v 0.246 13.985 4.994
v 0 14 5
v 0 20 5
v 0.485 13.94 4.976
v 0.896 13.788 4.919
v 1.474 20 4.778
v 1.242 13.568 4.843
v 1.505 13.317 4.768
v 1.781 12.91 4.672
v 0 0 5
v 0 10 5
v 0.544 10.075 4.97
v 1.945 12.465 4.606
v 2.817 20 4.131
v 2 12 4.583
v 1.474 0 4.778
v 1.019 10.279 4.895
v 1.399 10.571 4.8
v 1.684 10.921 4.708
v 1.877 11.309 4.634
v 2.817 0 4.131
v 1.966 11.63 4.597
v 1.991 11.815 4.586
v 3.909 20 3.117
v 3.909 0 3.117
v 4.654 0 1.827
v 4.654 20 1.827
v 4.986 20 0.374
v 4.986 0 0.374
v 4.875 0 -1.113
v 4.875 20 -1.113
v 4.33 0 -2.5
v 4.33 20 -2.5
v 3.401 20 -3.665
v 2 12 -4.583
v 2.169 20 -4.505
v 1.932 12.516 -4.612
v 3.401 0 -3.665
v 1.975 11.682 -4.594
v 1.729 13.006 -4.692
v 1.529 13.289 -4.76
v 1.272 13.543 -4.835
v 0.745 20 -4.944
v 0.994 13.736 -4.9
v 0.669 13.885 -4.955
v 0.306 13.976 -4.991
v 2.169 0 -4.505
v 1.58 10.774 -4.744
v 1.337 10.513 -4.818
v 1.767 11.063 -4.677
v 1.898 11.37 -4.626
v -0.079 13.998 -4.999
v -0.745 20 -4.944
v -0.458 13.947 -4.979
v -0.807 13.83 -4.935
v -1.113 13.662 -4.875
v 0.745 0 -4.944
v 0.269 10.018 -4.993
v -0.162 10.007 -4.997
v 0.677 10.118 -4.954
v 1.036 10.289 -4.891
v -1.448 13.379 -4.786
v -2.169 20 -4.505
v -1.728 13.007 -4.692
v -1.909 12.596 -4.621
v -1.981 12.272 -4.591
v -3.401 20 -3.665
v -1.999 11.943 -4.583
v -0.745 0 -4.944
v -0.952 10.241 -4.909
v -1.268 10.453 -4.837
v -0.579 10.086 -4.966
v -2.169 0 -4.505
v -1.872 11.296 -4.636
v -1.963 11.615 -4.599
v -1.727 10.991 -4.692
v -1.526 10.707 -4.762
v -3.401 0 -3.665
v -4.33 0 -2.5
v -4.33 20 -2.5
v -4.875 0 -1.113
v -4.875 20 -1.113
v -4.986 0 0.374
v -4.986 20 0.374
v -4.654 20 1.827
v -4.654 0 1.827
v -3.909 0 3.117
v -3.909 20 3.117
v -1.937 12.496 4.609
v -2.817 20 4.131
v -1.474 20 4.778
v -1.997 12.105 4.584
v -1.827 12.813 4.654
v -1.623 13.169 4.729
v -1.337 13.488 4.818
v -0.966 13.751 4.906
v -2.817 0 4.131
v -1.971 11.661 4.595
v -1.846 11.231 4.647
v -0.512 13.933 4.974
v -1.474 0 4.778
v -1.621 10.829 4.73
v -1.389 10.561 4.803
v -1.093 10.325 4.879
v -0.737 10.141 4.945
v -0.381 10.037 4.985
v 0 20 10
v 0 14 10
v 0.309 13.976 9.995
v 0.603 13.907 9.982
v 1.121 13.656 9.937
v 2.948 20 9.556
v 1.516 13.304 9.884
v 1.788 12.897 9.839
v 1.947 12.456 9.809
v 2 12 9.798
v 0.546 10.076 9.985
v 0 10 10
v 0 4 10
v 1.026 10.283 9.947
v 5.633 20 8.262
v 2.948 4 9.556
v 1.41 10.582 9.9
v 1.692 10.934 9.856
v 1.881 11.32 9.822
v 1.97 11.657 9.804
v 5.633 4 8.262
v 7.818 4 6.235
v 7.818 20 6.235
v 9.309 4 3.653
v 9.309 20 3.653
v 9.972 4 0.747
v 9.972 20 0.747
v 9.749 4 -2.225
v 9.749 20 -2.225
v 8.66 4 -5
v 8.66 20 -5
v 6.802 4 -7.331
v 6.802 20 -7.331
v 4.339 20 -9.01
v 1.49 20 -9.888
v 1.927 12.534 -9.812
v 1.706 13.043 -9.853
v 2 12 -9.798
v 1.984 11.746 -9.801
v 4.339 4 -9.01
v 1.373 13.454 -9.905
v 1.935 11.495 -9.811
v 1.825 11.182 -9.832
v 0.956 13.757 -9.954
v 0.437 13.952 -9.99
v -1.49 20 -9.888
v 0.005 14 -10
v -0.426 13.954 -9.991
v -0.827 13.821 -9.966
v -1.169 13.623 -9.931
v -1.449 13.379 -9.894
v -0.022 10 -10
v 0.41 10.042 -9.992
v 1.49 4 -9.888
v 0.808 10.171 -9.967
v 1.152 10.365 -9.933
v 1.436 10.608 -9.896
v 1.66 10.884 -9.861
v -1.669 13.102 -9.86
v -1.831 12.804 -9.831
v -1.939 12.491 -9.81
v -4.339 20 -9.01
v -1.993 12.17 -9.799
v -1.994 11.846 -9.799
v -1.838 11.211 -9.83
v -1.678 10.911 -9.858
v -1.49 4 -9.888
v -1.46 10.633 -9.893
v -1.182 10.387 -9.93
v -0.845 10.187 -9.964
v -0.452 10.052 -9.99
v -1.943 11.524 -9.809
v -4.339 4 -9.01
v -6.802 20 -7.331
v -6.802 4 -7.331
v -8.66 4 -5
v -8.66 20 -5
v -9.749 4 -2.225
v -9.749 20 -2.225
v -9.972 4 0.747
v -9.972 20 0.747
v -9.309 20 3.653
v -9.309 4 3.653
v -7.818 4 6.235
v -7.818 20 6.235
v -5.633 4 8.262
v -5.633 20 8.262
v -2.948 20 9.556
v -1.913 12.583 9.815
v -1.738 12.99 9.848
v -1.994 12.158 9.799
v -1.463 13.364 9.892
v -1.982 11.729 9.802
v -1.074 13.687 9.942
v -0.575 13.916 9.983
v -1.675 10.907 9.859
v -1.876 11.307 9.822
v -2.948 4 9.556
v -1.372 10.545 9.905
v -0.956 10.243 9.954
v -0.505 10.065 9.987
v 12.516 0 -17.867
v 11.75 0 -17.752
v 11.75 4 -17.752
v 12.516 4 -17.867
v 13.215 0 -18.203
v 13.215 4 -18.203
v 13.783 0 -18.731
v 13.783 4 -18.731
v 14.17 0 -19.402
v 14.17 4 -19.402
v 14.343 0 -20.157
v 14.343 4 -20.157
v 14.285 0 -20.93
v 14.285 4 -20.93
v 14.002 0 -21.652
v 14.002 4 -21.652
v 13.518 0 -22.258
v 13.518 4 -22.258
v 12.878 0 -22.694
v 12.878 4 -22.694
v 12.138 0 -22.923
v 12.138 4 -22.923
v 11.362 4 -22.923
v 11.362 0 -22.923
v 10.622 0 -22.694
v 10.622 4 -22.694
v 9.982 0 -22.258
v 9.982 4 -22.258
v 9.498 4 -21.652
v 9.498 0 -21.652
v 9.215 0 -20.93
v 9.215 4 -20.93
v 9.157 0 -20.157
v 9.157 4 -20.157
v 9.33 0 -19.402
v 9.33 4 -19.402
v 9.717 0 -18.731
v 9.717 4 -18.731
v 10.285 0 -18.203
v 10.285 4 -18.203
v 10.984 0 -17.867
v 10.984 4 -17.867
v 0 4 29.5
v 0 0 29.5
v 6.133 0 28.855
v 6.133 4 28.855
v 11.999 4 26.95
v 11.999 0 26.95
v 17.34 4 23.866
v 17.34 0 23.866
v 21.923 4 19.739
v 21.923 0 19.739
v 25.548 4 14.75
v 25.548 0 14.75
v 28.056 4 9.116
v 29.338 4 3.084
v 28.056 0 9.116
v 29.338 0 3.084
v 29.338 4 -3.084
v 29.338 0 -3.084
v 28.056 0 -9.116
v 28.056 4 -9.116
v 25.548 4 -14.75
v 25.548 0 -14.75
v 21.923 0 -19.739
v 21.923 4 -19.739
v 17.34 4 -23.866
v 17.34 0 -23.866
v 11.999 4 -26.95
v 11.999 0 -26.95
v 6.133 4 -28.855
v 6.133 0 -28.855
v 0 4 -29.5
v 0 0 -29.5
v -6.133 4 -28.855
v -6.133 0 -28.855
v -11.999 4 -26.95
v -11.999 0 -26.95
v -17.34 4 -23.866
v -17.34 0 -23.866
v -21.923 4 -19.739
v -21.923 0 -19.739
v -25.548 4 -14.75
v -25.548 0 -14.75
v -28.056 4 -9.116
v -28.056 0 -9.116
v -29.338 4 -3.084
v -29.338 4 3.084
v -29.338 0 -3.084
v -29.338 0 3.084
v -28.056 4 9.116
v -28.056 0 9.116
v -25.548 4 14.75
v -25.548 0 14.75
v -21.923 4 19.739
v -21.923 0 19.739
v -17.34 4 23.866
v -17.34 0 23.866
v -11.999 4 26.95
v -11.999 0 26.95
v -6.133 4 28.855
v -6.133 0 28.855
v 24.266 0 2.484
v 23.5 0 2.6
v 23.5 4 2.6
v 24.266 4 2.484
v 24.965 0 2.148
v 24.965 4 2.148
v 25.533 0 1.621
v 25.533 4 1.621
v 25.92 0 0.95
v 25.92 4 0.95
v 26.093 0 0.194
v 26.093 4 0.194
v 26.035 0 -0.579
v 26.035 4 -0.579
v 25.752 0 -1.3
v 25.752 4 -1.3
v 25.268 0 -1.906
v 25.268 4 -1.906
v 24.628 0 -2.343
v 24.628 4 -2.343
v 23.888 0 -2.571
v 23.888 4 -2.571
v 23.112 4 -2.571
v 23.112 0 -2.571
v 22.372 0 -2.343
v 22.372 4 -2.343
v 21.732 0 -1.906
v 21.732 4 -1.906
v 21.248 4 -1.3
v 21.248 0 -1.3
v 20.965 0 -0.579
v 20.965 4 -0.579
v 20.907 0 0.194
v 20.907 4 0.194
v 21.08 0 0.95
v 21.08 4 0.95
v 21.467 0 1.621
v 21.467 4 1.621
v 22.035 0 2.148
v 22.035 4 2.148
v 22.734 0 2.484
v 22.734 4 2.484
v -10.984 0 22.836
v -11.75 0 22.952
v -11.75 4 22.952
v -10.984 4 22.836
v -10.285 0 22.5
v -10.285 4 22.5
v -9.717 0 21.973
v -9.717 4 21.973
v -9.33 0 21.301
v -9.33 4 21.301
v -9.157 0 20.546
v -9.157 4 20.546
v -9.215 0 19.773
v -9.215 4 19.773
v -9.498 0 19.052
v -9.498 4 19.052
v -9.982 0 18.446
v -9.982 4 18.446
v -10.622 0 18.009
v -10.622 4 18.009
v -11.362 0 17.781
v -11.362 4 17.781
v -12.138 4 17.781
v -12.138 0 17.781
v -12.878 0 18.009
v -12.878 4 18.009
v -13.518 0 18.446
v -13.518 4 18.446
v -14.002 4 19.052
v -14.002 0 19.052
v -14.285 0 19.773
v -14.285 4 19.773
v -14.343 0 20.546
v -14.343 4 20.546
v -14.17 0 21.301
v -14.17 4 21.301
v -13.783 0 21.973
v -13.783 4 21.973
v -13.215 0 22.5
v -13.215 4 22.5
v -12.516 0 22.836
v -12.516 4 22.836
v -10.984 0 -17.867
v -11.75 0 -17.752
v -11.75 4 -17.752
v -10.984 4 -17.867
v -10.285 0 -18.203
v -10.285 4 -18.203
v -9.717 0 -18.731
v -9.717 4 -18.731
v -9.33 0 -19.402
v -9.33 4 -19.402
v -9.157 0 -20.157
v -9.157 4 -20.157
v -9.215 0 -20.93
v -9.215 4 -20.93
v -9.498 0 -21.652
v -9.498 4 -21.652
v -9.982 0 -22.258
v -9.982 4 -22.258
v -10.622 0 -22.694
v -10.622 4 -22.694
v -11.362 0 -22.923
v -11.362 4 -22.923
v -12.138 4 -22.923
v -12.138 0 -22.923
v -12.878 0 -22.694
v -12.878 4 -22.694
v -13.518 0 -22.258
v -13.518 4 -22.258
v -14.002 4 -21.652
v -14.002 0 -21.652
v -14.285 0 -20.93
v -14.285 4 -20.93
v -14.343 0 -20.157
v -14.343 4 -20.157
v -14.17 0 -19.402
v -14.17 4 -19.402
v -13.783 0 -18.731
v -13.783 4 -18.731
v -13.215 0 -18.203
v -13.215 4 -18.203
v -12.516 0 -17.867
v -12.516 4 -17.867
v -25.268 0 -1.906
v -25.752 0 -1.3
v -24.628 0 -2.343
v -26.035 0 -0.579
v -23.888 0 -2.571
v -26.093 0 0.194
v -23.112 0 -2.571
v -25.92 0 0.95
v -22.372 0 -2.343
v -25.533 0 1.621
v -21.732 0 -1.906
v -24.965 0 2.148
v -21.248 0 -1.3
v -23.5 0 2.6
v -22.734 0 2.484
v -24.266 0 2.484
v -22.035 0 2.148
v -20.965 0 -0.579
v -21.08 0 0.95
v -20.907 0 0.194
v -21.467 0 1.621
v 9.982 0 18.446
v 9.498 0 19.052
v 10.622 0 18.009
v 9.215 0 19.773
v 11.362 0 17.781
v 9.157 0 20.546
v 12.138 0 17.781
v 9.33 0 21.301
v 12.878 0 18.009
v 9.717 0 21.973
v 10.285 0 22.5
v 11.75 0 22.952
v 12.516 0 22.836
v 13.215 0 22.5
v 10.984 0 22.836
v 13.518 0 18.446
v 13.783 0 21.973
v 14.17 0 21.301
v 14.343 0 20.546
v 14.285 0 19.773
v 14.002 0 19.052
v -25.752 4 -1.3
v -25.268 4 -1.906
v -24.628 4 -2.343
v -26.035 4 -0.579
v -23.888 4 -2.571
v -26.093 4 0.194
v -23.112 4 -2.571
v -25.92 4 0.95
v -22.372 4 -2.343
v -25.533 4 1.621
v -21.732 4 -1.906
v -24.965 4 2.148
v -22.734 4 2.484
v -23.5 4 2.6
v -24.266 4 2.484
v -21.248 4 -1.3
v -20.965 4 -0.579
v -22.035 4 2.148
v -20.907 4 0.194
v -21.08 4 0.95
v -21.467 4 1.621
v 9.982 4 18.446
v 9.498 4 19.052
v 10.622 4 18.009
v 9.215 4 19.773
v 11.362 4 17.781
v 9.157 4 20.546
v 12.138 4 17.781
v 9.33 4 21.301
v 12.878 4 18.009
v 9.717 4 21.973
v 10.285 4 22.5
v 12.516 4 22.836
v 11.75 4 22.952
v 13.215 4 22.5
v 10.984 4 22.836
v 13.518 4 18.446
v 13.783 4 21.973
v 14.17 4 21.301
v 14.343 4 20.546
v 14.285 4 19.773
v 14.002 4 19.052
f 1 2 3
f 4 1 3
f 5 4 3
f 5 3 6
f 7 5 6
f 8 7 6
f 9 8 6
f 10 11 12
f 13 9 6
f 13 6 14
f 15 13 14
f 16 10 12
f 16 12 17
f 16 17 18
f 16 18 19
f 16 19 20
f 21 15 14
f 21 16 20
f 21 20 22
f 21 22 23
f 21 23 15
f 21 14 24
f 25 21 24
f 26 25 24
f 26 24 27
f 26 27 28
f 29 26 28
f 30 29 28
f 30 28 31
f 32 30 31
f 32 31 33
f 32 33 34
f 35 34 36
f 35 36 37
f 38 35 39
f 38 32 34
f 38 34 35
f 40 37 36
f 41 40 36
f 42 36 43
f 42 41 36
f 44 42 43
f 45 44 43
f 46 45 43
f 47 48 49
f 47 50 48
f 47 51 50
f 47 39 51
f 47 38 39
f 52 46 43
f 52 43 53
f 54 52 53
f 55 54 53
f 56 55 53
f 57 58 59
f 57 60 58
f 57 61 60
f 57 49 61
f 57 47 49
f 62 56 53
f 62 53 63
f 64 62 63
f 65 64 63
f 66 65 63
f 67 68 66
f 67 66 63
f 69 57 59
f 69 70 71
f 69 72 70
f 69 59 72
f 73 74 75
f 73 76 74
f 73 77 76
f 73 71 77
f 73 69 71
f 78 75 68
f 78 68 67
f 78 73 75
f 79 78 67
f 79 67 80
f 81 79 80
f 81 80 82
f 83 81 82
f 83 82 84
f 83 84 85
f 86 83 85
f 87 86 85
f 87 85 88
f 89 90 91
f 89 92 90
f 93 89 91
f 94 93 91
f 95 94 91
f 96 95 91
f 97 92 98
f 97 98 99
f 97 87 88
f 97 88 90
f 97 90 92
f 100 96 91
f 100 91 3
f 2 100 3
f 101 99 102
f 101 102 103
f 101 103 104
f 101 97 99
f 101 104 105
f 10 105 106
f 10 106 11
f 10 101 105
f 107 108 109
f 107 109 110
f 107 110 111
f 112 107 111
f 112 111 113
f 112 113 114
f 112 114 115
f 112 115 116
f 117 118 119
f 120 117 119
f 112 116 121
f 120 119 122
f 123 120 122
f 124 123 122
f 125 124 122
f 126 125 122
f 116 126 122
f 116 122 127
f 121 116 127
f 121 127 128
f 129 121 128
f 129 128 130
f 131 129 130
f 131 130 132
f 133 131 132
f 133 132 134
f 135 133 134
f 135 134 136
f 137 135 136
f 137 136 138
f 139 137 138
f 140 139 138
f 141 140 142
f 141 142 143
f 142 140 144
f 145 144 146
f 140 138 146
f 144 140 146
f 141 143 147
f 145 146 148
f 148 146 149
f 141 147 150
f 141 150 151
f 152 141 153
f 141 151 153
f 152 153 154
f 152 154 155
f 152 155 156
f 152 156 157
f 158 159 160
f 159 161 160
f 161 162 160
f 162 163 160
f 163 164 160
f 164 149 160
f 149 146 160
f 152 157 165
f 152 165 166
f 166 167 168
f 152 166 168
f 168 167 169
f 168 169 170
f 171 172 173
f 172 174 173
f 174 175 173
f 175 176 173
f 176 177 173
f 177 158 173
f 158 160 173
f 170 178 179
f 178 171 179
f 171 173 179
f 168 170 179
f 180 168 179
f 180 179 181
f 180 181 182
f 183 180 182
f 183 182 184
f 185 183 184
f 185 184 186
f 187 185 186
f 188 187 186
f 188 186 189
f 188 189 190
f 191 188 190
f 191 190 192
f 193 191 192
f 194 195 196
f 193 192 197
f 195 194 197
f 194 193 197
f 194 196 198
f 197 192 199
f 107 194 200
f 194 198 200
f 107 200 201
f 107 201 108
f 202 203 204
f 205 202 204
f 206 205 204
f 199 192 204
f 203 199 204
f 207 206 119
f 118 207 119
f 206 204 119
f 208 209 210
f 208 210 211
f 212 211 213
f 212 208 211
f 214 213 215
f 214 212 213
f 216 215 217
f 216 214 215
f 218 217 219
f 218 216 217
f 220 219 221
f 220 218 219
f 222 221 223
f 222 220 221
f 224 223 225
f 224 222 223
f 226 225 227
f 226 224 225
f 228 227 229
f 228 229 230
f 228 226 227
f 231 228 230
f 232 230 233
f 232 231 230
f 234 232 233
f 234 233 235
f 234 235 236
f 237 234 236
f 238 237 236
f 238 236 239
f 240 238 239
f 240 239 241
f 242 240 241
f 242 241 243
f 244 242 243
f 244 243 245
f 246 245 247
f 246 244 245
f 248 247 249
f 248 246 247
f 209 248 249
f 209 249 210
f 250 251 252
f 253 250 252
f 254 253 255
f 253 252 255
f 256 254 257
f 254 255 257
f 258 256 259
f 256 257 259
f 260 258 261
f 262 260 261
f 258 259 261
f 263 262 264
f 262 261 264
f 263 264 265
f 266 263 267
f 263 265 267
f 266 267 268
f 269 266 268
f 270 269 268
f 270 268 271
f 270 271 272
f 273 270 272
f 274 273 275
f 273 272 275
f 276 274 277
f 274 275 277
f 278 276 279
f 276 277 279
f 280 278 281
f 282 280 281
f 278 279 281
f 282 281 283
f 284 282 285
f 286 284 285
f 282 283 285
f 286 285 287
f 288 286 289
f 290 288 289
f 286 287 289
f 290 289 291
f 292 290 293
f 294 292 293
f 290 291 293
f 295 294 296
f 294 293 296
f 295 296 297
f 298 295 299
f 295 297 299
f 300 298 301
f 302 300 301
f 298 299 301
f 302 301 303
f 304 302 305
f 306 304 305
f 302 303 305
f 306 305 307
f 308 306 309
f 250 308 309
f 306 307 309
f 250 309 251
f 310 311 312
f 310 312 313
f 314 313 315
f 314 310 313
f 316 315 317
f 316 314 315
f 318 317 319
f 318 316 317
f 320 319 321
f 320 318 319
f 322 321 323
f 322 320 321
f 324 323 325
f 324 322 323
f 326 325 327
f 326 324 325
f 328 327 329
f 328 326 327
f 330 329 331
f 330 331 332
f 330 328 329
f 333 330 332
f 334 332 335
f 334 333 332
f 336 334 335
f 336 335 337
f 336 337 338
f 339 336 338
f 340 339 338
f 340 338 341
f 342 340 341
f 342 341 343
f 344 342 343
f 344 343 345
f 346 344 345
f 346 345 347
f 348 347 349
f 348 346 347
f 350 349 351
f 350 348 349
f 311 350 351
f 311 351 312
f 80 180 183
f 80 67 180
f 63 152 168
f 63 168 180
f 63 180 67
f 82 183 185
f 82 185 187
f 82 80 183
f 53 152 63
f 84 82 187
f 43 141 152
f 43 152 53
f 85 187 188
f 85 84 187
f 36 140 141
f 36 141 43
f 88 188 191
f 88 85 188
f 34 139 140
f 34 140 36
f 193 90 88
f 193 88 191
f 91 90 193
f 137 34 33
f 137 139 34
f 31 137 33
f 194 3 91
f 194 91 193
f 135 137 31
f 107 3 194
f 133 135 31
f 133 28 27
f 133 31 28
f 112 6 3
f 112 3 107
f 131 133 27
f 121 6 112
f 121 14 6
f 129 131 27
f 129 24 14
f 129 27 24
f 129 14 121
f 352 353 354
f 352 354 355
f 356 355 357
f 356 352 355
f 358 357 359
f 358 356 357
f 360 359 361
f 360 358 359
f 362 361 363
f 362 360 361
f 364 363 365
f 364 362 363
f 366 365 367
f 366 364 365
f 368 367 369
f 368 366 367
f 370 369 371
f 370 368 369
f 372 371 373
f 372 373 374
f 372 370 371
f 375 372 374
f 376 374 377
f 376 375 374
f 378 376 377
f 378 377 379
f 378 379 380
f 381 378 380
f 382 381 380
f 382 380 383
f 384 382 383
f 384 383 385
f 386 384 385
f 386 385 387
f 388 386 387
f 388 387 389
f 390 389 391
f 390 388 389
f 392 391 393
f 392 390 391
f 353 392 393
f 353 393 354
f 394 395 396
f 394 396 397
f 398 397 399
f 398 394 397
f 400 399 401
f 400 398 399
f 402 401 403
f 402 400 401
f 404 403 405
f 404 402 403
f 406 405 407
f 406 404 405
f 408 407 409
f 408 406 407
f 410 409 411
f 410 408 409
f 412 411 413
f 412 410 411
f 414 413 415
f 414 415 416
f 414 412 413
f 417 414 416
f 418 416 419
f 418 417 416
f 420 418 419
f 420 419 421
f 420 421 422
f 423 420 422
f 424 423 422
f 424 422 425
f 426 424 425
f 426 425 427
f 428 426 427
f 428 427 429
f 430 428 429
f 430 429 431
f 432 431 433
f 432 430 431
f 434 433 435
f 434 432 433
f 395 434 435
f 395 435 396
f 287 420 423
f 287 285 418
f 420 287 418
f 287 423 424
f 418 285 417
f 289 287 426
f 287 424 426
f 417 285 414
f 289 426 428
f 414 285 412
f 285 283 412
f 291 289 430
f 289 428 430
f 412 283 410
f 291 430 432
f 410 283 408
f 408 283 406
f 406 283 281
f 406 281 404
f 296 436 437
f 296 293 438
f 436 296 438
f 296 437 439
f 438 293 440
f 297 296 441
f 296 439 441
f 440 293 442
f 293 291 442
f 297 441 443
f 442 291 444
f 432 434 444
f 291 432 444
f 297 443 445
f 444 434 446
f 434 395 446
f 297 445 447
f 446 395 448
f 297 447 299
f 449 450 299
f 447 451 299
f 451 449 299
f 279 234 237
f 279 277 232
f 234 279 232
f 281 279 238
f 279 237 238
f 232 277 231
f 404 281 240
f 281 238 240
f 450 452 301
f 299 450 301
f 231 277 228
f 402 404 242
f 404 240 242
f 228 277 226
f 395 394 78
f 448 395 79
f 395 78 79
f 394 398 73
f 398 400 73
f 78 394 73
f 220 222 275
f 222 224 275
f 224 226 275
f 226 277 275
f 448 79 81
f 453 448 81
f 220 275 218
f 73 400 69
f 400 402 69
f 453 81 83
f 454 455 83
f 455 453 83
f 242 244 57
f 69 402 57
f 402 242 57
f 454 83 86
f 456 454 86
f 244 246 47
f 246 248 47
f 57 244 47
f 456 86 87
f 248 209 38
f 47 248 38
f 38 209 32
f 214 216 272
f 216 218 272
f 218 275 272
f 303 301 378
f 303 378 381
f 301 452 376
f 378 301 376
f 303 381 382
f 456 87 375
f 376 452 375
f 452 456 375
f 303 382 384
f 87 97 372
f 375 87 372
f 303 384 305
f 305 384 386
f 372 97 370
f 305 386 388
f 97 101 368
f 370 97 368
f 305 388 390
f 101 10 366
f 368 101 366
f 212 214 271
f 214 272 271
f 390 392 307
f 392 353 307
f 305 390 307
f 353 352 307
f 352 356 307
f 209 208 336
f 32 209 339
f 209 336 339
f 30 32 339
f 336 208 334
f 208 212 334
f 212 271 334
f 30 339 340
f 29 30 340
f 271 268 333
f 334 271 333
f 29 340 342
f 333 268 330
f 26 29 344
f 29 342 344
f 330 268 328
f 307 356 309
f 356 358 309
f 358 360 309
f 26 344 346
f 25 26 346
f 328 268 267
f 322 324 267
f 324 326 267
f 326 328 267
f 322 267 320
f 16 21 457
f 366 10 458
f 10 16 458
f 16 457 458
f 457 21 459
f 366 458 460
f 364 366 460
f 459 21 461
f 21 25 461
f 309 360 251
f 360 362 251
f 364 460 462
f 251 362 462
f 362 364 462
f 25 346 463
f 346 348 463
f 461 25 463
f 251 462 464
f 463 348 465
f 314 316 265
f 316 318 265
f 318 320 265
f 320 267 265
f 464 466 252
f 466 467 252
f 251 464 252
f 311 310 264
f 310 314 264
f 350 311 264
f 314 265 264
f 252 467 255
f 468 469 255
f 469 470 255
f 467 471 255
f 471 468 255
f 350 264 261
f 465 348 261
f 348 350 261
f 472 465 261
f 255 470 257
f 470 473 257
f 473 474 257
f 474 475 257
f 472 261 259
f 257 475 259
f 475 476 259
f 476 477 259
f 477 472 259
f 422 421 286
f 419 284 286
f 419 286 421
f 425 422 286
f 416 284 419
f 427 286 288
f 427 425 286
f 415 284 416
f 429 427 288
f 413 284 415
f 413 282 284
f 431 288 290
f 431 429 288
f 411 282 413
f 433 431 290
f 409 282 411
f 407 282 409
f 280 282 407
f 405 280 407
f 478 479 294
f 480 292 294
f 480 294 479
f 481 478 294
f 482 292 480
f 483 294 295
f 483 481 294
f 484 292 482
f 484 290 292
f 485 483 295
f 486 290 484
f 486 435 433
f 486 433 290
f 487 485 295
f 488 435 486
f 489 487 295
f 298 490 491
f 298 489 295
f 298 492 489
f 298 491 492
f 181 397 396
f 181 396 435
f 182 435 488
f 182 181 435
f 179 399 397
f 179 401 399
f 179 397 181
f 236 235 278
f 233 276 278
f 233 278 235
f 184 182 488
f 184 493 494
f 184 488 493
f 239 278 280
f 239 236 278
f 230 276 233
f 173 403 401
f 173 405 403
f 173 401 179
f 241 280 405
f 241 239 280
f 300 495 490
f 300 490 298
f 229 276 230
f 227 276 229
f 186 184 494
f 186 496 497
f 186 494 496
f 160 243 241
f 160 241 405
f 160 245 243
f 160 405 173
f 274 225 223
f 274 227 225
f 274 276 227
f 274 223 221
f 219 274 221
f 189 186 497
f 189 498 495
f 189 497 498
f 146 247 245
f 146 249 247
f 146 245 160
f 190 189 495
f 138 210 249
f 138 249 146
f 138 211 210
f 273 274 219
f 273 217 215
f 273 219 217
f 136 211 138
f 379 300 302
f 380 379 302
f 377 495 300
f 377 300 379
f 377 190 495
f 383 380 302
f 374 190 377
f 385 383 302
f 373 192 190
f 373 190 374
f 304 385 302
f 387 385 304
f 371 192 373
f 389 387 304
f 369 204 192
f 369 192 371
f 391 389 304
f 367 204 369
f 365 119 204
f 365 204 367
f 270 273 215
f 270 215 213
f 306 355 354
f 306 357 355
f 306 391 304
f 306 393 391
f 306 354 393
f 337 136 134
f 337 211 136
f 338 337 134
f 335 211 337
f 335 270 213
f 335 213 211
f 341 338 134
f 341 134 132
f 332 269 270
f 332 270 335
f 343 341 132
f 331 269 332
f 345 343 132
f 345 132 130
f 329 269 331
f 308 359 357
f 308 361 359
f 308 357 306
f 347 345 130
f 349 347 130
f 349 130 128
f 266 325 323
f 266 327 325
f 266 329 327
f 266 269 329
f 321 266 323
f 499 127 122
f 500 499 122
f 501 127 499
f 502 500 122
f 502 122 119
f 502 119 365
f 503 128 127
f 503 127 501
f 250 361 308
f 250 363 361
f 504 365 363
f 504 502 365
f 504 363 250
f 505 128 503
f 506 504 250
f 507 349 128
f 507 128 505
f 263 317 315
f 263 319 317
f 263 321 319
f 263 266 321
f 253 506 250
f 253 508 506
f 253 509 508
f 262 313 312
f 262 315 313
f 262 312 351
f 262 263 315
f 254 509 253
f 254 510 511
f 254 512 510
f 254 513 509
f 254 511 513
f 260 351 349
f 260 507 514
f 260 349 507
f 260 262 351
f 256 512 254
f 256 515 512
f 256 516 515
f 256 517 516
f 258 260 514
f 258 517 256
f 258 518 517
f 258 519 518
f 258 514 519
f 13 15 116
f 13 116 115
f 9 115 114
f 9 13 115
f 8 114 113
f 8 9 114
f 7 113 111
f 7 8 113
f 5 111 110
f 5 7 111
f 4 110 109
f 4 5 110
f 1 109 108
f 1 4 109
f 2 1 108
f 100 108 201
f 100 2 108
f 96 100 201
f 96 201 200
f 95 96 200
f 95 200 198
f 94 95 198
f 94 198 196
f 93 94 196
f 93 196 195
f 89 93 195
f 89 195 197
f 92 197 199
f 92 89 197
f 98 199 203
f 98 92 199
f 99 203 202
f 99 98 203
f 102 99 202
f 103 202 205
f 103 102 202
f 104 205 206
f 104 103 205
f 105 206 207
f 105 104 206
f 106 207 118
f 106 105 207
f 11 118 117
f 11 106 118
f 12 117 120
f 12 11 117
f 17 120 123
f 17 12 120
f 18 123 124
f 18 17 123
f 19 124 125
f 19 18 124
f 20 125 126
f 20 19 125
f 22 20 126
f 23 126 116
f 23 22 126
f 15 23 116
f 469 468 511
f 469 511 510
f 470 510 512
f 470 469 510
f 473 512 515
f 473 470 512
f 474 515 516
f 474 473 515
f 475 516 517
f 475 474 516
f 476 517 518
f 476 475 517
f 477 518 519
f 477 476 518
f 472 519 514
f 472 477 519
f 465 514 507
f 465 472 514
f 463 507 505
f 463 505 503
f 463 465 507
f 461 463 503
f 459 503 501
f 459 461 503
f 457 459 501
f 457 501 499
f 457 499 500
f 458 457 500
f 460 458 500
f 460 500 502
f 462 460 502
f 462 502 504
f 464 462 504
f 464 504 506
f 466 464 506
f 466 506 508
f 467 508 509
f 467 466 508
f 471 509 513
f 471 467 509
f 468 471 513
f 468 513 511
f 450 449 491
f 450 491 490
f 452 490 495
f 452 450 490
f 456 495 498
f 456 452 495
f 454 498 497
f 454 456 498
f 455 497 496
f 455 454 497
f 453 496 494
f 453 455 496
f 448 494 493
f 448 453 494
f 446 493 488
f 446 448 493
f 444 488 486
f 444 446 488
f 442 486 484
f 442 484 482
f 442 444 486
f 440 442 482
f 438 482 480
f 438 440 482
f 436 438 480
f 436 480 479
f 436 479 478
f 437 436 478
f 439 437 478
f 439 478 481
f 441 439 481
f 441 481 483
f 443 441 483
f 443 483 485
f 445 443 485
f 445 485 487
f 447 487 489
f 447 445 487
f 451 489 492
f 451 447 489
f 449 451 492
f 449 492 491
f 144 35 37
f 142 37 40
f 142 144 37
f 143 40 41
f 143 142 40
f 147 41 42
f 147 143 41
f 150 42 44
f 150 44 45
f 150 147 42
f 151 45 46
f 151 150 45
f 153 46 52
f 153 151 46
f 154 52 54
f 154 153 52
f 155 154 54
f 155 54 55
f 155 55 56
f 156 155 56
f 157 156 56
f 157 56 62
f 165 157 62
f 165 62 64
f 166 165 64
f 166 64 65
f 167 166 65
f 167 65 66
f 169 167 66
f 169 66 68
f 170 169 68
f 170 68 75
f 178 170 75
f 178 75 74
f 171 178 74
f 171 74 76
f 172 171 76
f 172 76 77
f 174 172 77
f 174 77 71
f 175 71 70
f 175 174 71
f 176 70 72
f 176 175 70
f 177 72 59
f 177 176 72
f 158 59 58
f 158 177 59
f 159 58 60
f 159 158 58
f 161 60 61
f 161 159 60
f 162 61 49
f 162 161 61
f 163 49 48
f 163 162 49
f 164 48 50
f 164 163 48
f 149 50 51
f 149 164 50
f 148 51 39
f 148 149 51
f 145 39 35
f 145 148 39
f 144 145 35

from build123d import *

# Parameters (mm, degrees)
SKETCH1_R               = 29.5
SKETCH1_R_2             = 2.6
SKETCH1_R_3             = 5
BOSS_EXTRUDE1_DEPTH     = 4
SKETCH1_3_R             = 10
SKETCH1_3_R_2           = 5
BOSS_EXTRUDE2_DEPTH     = 20
CUT_EXTRUDE1_DEPTH      = 47.265537931
CUT_EXTRUDE1_DEPTH_BACK = 47.265537931
SKETCH2_R               = 2


with BuildPart() as part:
    # Sketch1 → Boss-Extrude1 (new body)
    with BuildSketch(Plane(origin=(0, 0, 0), x_dir=(1, 0, 0), z_dir=(0, 1, 0))):
        Circle(SKETCH1_R)
        with Locations((-11.75, -20.351596989)):
            Circle(SKETCH1_R_2, mode=Mode.SUBTRACT)
        with Locations((11.75, -20.351596989)):
            Circle(SKETCH1_R_2, mode=Mode.SUBTRACT)
        with Locations((23.5, 0)):
            Circle(SKETCH1_R_2, mode=Mode.SUBTRACT)
        with Locations((-23.5, 0)):
            Circle(SKETCH1_R_2, mode=Mode.SUBTRACT)
        with Locations((-11.75, 20.351596989)):
            Circle(SKETCH1_R_2, mode=Mode.SUBTRACT)
        with Locations((11.75, 20.351596989)):
            Circle(SKETCH1_R_2, mode=Mode.SUBTRACT)
        Circle(SKETCH1_R_3, mode=Mode.SUBTRACT)
    extrude(amount=BOSS_EXTRUDE1_DEPTH)

    # Sketch1<3> → Boss-Extrude2 (add)
    with BuildSketch(Plane(origin=(0, 0, 0), x_dir=(1, 0, 0), z_dir=(0, 1, 0))):
        Circle(SKETCH1_3_R)
        Circle(SKETCH1_3_R_2, mode=Mode.SUBTRACT)
    extrude(amount=BOSS_EXTRUDE2_DEPTH)

    # Sketch2 → Cut-Extrude1 (cut, two sides: drawn at the far end of the back side and taken through both)
    with BuildSketch(Plane.XY.offset(-CUT_EXTRUDE1_DEPTH_BACK)):
        with Locations((0, 12)):
            Circle(SKETCH2_R)
    extrude(amount=CUT_EXTRUDE1_DEPTH + CUT_EXTRUDE1_DEPTH_BACK, mode=Mode.SUBTRACT)


solid = part.part
